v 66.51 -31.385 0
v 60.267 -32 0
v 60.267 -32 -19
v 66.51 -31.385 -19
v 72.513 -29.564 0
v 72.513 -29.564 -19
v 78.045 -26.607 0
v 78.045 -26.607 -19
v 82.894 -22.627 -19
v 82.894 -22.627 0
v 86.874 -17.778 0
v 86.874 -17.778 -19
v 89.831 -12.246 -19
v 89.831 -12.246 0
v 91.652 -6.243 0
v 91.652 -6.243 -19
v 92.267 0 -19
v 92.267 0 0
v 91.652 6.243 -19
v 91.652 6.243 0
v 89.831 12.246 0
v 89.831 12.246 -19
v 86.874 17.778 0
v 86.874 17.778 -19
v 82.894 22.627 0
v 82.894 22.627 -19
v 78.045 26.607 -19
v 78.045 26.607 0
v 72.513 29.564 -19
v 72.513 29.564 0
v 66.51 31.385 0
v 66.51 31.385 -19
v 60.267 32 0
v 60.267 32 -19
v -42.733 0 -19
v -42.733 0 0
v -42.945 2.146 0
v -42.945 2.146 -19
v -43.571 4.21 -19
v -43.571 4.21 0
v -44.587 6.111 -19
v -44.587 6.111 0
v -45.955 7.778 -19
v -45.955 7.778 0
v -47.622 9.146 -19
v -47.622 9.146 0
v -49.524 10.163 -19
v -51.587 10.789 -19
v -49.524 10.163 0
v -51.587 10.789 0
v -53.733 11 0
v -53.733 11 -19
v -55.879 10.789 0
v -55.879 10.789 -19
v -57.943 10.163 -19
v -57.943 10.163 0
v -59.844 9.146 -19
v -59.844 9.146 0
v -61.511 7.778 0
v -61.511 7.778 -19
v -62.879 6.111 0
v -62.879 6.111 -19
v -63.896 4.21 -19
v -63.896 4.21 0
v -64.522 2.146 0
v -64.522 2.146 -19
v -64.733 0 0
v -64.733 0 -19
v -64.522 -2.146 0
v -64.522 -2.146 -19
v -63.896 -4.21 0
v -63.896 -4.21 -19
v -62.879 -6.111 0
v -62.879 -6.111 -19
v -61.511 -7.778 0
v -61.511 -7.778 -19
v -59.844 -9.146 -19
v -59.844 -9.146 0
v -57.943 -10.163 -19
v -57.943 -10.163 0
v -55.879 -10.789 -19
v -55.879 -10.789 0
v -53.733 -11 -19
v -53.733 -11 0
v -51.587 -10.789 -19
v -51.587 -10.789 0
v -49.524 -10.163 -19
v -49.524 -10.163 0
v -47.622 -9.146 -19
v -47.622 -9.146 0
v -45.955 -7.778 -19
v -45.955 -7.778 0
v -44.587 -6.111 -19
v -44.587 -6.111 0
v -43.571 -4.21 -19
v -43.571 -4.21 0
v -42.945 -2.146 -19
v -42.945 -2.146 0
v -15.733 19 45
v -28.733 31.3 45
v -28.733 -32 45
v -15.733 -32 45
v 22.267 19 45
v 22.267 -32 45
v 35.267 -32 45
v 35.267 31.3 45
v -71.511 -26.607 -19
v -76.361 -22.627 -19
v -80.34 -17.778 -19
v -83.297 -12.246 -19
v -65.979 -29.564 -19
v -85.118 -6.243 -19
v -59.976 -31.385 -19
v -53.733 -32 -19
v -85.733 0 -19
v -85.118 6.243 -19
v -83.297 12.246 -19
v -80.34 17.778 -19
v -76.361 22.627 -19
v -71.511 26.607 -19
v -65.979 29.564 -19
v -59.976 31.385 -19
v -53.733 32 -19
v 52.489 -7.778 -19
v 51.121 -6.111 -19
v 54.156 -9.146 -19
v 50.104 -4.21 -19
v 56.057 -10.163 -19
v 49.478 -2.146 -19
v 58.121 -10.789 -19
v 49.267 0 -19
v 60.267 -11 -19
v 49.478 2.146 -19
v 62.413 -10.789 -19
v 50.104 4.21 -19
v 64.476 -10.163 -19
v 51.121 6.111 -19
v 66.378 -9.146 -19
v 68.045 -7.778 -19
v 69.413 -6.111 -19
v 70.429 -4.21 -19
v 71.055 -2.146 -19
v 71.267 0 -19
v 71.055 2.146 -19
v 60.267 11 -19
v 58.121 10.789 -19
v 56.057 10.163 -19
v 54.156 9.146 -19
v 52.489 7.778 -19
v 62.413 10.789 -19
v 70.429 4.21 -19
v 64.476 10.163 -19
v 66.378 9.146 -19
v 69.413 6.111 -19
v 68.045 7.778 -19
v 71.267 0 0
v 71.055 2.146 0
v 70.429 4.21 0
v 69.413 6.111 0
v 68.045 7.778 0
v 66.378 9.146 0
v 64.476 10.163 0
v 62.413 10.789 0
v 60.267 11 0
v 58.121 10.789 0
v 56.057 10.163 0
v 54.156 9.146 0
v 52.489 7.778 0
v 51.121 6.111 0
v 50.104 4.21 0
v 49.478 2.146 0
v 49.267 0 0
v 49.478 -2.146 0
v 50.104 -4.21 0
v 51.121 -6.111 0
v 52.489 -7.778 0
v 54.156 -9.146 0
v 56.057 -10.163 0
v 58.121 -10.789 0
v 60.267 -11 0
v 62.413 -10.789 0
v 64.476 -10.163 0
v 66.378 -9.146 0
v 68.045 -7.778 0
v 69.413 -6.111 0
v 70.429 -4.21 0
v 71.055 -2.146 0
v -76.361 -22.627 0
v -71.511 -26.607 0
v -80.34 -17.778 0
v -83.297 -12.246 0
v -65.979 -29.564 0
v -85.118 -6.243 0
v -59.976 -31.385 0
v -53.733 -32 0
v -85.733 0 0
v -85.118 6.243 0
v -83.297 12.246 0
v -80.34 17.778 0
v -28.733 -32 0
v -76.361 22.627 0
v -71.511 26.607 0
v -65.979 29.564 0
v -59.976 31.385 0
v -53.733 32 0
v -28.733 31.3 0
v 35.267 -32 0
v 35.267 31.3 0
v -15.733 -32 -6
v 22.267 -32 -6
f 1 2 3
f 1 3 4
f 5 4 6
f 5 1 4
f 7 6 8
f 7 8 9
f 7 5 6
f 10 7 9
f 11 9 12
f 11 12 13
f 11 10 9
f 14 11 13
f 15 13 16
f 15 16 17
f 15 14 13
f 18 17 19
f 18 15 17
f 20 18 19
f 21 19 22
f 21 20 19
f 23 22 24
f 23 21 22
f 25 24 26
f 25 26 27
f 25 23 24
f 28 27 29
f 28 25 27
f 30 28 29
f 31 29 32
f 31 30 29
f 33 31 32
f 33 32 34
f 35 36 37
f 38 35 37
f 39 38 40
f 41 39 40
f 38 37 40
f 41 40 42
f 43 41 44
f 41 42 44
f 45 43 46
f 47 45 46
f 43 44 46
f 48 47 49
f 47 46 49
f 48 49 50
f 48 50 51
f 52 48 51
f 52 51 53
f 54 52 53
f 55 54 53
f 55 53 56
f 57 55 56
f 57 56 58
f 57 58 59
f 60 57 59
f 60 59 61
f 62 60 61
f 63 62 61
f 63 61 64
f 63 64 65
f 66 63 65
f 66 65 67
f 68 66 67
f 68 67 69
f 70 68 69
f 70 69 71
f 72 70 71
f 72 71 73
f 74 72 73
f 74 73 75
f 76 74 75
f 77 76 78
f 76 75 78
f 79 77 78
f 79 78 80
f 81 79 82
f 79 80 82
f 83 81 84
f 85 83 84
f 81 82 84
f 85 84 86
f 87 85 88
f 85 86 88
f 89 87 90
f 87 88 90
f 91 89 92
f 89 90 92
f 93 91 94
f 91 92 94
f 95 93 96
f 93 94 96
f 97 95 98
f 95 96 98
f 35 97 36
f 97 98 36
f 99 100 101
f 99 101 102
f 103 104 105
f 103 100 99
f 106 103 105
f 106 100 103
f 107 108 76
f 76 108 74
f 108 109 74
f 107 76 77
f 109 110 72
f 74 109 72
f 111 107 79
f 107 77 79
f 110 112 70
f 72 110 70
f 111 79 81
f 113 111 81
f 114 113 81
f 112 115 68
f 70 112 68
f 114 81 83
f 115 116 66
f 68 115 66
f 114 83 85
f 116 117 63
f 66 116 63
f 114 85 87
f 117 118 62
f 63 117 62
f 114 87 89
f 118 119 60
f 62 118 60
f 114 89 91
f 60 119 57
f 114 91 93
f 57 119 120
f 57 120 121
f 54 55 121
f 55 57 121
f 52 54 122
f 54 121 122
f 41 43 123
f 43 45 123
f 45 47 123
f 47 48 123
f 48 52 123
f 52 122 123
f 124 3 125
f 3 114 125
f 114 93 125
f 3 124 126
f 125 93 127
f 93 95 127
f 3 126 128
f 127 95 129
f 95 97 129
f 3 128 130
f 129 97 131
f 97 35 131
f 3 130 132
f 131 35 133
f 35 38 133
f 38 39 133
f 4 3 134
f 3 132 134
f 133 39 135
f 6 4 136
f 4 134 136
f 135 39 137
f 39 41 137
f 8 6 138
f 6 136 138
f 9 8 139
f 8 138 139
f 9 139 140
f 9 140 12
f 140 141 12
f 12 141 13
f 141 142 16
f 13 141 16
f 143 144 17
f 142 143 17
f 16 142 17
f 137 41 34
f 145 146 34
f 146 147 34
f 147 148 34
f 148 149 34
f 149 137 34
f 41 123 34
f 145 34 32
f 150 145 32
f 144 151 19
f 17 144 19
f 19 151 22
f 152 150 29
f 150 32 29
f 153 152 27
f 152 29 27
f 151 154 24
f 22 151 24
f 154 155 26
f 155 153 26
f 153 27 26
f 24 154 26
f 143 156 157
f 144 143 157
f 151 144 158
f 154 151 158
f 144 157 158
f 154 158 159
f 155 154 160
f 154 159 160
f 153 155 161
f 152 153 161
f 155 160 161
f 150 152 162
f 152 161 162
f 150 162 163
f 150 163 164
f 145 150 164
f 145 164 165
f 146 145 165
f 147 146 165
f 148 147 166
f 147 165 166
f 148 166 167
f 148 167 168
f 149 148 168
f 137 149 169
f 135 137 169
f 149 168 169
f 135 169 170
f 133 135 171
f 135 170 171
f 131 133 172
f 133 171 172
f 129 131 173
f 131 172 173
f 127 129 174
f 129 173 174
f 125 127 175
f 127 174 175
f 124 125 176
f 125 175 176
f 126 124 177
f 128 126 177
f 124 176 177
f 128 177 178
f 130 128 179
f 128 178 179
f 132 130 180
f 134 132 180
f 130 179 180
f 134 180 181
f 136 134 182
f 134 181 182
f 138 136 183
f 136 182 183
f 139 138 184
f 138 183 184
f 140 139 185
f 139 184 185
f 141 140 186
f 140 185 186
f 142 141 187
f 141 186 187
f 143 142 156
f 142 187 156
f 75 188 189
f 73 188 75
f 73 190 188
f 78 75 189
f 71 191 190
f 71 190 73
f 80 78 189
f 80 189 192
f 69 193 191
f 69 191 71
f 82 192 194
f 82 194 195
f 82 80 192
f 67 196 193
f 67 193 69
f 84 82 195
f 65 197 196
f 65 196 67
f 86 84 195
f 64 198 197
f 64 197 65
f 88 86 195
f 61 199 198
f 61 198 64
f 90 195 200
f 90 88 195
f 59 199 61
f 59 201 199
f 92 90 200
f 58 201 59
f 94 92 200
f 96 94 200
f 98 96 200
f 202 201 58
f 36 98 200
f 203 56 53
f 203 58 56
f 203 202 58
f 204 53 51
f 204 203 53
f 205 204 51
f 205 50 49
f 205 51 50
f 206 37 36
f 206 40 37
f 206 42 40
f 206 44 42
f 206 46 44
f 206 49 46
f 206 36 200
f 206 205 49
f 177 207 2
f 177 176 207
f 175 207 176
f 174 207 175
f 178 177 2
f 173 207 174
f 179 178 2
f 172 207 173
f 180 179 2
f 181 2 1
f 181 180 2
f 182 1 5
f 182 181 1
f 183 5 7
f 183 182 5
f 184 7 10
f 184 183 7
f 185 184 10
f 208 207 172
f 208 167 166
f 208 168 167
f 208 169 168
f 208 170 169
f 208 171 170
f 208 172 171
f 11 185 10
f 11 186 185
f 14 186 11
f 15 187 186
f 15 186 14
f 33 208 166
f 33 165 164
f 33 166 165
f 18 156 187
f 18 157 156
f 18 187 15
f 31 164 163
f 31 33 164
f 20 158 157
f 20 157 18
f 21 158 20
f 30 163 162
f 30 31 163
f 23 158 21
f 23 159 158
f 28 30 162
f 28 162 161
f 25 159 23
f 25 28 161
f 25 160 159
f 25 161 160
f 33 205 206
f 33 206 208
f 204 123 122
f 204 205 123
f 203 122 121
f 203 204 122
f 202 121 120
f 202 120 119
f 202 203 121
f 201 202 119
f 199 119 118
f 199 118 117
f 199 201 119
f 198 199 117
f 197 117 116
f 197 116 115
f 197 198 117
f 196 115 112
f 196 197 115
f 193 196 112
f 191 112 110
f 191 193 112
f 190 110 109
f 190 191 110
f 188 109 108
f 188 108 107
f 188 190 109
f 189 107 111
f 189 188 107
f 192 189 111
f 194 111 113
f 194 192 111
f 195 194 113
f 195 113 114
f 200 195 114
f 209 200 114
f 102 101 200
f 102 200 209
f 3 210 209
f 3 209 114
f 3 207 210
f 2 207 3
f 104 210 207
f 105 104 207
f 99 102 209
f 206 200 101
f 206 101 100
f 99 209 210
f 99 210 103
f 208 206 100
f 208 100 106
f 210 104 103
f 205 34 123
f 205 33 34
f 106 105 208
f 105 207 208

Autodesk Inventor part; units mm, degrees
ref_plane "YZ Plane" through (0, 0, 0) normal (1, 0, 0) x (0, 1, 0)
sketch "Sketch1" plane through (0, 0, 0) normal (0, 0, 1) x (1, 0, 0)
  point P0 (0, 0)
sketch "Sketch2" plane through (0, 0, 0) normal (0, 0, 1) x (1, 0, 0)
  line L0 (-53.7332, 0) -> (60.2668, 0) construction
  line L1 (-53.7332, -32) -> (60.2668, -32)
  line L2 (60.2668, 32) -> (-53.7332, 32)
  arc A0 (-53.7332, 32) -> (-53.7332, -32) centre (-53.7332, 0) ccw
  arc A1 (60.2668, -32) -> (60.2668, 32) centre (60.2668, 0) ccw
  point P0 (0, 0)
  point P1 (3.2668, 0)
  dimension "d0" = 32
  dimension "d1" = 32
  dimension "d2" = 114
extrude "Extrusion1" add sketch "Sketch2" against normal blind 19
ref_plane "Work Plane1" through (0, 0, 0) normal (0, 0, 1) x (1, 0, 0)
sketch "Sketch3" plane through (0, 0, 0) normal (0, 0, 1) x (1, 0, 0)
  arc A0 (60.2668, -32) -> (60.2668, 32) centre (60.2668, 0) ccw projected
  line L0 (60.2668, -32) -> (-53.7332, -32) projected
  line L1 (-28.7332, -32) -> (-28.7332, 31.3001)
  line L2 (35.2668, -32) -> (35.2668, 31.3001)
  line L3 (-53.7332, -32) -> (60.2668, -32) projected
  line L4 (-15.7332, -32) -> (-15.7332, 19)
  line L5 (22.2668, 19) -> (22.2668, -32)
  line L6 (-15.7332, 19) -> (22.2668, 19)
  line L7 (-28.7332, 31.3001) -> (35.2668, 31.3001)
  line L8 (-53.7332, 32) -> (60.2668, 32) projected
  point P0 (0, 0)
  point P1 (-54.8329, -31.8056)
  point P2 (3.2668, -32)
  point P3 (3.2668, -32)
  point P4 (3.2668, -32)
  point P5 (-15.7332, 32)
  point P6 (20.2211, 31.3001)
  point P7 (3.2668, -32)
  point P8 (3.2668, -32)
  point P9 (22.2668, -32)
  point P10 (3.2668, -32)
  point P11 (3.2668, -32)
  dimension "d6" = 58.0997
  dimension "d7" = 64
  dimension "d12" = 51
  dimension "d17" = 38
  dimension "d18" = 19
  dimension "d19" = 19
extrude "Extrusion2" add sketch "Sketch3" along normal blind 45 contours L0 L5 L6 L4 L1 L7 L2
ref_plane "Work Plane2" through (0, 0, 0) normal (0, 0, 1) x (1, 0, 0)
sketch "Sketch5" plane through (-53.7332, -32, -19) normal (0, -1, 0) x (1, 0, 0)
  line L0 (38, 19) -> (76, 19) projected
  line L1 (38, 19) -> (76, 19)
  line L2 (76, 19) -> (76, 13)
  line L3 (76, 13) -> (38, 13)
  line L4 (38, 13) -> (38, 19)
  point P0 (53.7332, 19)
  dimension "d16" = 38
  dimension "d20" = 6
extrude "Extrusion3" cut sketch "Sketch5" against normal blind 51
sketch "Sketch6" plane through (-15.7332, -32, 45) normal (1, 0, 0) x (0, 0, -1)
  line L0 (0, 51) -> (51, 51)
  line L1 (51, 51) -> (51, 0)
  line L2 (51, 0) -> (0, 51)
  point P0 (45, 32)
extrude "Extrusion4" add sketch "Sketch6" along normal blind 51
sketch "Sketch7" plane through (0, 0, 0) normal (0, 0, 1) x (1, 0, 0)
  line L0 (-28.7332, -32) -> (-28.7332, 31.3001) projected
  line L1 (-28.7332, 31.3001) -> (35.2668, 31.3001) projected
  line L2 (35.2668, 31.3001) -> (35.2668, -32) projected
  line L3 (35.2668, -32) -> (60.2668, -32) projected
  arc A0 (60.2668, -32) -> (60.2668, 32) centre (60.2668, 0) ccw projected
  line L4 (60.2668, 32) -> (-53.7332, 32) projected
  arc A1 (-53.7332, 32) -> (-53.7332, -32) centre (-53.7332, 0) ccw projected
  line L5 (-53.7332, -32) -> (-28.7332, -32) projected
  circle A2 centre (-53.7332, 0) radius 11
  circle A3 centre (60.2668, 0) radius 11
  point P0 (0, 0)
  dimension "d25" = 22
  dimension "d26" = 22
  dimension "d27" = 114
extrude "Extrusion5" cut sketch "Sketch7" against normal through all contours A2 | A3
properties material "Nylon 6/6"
